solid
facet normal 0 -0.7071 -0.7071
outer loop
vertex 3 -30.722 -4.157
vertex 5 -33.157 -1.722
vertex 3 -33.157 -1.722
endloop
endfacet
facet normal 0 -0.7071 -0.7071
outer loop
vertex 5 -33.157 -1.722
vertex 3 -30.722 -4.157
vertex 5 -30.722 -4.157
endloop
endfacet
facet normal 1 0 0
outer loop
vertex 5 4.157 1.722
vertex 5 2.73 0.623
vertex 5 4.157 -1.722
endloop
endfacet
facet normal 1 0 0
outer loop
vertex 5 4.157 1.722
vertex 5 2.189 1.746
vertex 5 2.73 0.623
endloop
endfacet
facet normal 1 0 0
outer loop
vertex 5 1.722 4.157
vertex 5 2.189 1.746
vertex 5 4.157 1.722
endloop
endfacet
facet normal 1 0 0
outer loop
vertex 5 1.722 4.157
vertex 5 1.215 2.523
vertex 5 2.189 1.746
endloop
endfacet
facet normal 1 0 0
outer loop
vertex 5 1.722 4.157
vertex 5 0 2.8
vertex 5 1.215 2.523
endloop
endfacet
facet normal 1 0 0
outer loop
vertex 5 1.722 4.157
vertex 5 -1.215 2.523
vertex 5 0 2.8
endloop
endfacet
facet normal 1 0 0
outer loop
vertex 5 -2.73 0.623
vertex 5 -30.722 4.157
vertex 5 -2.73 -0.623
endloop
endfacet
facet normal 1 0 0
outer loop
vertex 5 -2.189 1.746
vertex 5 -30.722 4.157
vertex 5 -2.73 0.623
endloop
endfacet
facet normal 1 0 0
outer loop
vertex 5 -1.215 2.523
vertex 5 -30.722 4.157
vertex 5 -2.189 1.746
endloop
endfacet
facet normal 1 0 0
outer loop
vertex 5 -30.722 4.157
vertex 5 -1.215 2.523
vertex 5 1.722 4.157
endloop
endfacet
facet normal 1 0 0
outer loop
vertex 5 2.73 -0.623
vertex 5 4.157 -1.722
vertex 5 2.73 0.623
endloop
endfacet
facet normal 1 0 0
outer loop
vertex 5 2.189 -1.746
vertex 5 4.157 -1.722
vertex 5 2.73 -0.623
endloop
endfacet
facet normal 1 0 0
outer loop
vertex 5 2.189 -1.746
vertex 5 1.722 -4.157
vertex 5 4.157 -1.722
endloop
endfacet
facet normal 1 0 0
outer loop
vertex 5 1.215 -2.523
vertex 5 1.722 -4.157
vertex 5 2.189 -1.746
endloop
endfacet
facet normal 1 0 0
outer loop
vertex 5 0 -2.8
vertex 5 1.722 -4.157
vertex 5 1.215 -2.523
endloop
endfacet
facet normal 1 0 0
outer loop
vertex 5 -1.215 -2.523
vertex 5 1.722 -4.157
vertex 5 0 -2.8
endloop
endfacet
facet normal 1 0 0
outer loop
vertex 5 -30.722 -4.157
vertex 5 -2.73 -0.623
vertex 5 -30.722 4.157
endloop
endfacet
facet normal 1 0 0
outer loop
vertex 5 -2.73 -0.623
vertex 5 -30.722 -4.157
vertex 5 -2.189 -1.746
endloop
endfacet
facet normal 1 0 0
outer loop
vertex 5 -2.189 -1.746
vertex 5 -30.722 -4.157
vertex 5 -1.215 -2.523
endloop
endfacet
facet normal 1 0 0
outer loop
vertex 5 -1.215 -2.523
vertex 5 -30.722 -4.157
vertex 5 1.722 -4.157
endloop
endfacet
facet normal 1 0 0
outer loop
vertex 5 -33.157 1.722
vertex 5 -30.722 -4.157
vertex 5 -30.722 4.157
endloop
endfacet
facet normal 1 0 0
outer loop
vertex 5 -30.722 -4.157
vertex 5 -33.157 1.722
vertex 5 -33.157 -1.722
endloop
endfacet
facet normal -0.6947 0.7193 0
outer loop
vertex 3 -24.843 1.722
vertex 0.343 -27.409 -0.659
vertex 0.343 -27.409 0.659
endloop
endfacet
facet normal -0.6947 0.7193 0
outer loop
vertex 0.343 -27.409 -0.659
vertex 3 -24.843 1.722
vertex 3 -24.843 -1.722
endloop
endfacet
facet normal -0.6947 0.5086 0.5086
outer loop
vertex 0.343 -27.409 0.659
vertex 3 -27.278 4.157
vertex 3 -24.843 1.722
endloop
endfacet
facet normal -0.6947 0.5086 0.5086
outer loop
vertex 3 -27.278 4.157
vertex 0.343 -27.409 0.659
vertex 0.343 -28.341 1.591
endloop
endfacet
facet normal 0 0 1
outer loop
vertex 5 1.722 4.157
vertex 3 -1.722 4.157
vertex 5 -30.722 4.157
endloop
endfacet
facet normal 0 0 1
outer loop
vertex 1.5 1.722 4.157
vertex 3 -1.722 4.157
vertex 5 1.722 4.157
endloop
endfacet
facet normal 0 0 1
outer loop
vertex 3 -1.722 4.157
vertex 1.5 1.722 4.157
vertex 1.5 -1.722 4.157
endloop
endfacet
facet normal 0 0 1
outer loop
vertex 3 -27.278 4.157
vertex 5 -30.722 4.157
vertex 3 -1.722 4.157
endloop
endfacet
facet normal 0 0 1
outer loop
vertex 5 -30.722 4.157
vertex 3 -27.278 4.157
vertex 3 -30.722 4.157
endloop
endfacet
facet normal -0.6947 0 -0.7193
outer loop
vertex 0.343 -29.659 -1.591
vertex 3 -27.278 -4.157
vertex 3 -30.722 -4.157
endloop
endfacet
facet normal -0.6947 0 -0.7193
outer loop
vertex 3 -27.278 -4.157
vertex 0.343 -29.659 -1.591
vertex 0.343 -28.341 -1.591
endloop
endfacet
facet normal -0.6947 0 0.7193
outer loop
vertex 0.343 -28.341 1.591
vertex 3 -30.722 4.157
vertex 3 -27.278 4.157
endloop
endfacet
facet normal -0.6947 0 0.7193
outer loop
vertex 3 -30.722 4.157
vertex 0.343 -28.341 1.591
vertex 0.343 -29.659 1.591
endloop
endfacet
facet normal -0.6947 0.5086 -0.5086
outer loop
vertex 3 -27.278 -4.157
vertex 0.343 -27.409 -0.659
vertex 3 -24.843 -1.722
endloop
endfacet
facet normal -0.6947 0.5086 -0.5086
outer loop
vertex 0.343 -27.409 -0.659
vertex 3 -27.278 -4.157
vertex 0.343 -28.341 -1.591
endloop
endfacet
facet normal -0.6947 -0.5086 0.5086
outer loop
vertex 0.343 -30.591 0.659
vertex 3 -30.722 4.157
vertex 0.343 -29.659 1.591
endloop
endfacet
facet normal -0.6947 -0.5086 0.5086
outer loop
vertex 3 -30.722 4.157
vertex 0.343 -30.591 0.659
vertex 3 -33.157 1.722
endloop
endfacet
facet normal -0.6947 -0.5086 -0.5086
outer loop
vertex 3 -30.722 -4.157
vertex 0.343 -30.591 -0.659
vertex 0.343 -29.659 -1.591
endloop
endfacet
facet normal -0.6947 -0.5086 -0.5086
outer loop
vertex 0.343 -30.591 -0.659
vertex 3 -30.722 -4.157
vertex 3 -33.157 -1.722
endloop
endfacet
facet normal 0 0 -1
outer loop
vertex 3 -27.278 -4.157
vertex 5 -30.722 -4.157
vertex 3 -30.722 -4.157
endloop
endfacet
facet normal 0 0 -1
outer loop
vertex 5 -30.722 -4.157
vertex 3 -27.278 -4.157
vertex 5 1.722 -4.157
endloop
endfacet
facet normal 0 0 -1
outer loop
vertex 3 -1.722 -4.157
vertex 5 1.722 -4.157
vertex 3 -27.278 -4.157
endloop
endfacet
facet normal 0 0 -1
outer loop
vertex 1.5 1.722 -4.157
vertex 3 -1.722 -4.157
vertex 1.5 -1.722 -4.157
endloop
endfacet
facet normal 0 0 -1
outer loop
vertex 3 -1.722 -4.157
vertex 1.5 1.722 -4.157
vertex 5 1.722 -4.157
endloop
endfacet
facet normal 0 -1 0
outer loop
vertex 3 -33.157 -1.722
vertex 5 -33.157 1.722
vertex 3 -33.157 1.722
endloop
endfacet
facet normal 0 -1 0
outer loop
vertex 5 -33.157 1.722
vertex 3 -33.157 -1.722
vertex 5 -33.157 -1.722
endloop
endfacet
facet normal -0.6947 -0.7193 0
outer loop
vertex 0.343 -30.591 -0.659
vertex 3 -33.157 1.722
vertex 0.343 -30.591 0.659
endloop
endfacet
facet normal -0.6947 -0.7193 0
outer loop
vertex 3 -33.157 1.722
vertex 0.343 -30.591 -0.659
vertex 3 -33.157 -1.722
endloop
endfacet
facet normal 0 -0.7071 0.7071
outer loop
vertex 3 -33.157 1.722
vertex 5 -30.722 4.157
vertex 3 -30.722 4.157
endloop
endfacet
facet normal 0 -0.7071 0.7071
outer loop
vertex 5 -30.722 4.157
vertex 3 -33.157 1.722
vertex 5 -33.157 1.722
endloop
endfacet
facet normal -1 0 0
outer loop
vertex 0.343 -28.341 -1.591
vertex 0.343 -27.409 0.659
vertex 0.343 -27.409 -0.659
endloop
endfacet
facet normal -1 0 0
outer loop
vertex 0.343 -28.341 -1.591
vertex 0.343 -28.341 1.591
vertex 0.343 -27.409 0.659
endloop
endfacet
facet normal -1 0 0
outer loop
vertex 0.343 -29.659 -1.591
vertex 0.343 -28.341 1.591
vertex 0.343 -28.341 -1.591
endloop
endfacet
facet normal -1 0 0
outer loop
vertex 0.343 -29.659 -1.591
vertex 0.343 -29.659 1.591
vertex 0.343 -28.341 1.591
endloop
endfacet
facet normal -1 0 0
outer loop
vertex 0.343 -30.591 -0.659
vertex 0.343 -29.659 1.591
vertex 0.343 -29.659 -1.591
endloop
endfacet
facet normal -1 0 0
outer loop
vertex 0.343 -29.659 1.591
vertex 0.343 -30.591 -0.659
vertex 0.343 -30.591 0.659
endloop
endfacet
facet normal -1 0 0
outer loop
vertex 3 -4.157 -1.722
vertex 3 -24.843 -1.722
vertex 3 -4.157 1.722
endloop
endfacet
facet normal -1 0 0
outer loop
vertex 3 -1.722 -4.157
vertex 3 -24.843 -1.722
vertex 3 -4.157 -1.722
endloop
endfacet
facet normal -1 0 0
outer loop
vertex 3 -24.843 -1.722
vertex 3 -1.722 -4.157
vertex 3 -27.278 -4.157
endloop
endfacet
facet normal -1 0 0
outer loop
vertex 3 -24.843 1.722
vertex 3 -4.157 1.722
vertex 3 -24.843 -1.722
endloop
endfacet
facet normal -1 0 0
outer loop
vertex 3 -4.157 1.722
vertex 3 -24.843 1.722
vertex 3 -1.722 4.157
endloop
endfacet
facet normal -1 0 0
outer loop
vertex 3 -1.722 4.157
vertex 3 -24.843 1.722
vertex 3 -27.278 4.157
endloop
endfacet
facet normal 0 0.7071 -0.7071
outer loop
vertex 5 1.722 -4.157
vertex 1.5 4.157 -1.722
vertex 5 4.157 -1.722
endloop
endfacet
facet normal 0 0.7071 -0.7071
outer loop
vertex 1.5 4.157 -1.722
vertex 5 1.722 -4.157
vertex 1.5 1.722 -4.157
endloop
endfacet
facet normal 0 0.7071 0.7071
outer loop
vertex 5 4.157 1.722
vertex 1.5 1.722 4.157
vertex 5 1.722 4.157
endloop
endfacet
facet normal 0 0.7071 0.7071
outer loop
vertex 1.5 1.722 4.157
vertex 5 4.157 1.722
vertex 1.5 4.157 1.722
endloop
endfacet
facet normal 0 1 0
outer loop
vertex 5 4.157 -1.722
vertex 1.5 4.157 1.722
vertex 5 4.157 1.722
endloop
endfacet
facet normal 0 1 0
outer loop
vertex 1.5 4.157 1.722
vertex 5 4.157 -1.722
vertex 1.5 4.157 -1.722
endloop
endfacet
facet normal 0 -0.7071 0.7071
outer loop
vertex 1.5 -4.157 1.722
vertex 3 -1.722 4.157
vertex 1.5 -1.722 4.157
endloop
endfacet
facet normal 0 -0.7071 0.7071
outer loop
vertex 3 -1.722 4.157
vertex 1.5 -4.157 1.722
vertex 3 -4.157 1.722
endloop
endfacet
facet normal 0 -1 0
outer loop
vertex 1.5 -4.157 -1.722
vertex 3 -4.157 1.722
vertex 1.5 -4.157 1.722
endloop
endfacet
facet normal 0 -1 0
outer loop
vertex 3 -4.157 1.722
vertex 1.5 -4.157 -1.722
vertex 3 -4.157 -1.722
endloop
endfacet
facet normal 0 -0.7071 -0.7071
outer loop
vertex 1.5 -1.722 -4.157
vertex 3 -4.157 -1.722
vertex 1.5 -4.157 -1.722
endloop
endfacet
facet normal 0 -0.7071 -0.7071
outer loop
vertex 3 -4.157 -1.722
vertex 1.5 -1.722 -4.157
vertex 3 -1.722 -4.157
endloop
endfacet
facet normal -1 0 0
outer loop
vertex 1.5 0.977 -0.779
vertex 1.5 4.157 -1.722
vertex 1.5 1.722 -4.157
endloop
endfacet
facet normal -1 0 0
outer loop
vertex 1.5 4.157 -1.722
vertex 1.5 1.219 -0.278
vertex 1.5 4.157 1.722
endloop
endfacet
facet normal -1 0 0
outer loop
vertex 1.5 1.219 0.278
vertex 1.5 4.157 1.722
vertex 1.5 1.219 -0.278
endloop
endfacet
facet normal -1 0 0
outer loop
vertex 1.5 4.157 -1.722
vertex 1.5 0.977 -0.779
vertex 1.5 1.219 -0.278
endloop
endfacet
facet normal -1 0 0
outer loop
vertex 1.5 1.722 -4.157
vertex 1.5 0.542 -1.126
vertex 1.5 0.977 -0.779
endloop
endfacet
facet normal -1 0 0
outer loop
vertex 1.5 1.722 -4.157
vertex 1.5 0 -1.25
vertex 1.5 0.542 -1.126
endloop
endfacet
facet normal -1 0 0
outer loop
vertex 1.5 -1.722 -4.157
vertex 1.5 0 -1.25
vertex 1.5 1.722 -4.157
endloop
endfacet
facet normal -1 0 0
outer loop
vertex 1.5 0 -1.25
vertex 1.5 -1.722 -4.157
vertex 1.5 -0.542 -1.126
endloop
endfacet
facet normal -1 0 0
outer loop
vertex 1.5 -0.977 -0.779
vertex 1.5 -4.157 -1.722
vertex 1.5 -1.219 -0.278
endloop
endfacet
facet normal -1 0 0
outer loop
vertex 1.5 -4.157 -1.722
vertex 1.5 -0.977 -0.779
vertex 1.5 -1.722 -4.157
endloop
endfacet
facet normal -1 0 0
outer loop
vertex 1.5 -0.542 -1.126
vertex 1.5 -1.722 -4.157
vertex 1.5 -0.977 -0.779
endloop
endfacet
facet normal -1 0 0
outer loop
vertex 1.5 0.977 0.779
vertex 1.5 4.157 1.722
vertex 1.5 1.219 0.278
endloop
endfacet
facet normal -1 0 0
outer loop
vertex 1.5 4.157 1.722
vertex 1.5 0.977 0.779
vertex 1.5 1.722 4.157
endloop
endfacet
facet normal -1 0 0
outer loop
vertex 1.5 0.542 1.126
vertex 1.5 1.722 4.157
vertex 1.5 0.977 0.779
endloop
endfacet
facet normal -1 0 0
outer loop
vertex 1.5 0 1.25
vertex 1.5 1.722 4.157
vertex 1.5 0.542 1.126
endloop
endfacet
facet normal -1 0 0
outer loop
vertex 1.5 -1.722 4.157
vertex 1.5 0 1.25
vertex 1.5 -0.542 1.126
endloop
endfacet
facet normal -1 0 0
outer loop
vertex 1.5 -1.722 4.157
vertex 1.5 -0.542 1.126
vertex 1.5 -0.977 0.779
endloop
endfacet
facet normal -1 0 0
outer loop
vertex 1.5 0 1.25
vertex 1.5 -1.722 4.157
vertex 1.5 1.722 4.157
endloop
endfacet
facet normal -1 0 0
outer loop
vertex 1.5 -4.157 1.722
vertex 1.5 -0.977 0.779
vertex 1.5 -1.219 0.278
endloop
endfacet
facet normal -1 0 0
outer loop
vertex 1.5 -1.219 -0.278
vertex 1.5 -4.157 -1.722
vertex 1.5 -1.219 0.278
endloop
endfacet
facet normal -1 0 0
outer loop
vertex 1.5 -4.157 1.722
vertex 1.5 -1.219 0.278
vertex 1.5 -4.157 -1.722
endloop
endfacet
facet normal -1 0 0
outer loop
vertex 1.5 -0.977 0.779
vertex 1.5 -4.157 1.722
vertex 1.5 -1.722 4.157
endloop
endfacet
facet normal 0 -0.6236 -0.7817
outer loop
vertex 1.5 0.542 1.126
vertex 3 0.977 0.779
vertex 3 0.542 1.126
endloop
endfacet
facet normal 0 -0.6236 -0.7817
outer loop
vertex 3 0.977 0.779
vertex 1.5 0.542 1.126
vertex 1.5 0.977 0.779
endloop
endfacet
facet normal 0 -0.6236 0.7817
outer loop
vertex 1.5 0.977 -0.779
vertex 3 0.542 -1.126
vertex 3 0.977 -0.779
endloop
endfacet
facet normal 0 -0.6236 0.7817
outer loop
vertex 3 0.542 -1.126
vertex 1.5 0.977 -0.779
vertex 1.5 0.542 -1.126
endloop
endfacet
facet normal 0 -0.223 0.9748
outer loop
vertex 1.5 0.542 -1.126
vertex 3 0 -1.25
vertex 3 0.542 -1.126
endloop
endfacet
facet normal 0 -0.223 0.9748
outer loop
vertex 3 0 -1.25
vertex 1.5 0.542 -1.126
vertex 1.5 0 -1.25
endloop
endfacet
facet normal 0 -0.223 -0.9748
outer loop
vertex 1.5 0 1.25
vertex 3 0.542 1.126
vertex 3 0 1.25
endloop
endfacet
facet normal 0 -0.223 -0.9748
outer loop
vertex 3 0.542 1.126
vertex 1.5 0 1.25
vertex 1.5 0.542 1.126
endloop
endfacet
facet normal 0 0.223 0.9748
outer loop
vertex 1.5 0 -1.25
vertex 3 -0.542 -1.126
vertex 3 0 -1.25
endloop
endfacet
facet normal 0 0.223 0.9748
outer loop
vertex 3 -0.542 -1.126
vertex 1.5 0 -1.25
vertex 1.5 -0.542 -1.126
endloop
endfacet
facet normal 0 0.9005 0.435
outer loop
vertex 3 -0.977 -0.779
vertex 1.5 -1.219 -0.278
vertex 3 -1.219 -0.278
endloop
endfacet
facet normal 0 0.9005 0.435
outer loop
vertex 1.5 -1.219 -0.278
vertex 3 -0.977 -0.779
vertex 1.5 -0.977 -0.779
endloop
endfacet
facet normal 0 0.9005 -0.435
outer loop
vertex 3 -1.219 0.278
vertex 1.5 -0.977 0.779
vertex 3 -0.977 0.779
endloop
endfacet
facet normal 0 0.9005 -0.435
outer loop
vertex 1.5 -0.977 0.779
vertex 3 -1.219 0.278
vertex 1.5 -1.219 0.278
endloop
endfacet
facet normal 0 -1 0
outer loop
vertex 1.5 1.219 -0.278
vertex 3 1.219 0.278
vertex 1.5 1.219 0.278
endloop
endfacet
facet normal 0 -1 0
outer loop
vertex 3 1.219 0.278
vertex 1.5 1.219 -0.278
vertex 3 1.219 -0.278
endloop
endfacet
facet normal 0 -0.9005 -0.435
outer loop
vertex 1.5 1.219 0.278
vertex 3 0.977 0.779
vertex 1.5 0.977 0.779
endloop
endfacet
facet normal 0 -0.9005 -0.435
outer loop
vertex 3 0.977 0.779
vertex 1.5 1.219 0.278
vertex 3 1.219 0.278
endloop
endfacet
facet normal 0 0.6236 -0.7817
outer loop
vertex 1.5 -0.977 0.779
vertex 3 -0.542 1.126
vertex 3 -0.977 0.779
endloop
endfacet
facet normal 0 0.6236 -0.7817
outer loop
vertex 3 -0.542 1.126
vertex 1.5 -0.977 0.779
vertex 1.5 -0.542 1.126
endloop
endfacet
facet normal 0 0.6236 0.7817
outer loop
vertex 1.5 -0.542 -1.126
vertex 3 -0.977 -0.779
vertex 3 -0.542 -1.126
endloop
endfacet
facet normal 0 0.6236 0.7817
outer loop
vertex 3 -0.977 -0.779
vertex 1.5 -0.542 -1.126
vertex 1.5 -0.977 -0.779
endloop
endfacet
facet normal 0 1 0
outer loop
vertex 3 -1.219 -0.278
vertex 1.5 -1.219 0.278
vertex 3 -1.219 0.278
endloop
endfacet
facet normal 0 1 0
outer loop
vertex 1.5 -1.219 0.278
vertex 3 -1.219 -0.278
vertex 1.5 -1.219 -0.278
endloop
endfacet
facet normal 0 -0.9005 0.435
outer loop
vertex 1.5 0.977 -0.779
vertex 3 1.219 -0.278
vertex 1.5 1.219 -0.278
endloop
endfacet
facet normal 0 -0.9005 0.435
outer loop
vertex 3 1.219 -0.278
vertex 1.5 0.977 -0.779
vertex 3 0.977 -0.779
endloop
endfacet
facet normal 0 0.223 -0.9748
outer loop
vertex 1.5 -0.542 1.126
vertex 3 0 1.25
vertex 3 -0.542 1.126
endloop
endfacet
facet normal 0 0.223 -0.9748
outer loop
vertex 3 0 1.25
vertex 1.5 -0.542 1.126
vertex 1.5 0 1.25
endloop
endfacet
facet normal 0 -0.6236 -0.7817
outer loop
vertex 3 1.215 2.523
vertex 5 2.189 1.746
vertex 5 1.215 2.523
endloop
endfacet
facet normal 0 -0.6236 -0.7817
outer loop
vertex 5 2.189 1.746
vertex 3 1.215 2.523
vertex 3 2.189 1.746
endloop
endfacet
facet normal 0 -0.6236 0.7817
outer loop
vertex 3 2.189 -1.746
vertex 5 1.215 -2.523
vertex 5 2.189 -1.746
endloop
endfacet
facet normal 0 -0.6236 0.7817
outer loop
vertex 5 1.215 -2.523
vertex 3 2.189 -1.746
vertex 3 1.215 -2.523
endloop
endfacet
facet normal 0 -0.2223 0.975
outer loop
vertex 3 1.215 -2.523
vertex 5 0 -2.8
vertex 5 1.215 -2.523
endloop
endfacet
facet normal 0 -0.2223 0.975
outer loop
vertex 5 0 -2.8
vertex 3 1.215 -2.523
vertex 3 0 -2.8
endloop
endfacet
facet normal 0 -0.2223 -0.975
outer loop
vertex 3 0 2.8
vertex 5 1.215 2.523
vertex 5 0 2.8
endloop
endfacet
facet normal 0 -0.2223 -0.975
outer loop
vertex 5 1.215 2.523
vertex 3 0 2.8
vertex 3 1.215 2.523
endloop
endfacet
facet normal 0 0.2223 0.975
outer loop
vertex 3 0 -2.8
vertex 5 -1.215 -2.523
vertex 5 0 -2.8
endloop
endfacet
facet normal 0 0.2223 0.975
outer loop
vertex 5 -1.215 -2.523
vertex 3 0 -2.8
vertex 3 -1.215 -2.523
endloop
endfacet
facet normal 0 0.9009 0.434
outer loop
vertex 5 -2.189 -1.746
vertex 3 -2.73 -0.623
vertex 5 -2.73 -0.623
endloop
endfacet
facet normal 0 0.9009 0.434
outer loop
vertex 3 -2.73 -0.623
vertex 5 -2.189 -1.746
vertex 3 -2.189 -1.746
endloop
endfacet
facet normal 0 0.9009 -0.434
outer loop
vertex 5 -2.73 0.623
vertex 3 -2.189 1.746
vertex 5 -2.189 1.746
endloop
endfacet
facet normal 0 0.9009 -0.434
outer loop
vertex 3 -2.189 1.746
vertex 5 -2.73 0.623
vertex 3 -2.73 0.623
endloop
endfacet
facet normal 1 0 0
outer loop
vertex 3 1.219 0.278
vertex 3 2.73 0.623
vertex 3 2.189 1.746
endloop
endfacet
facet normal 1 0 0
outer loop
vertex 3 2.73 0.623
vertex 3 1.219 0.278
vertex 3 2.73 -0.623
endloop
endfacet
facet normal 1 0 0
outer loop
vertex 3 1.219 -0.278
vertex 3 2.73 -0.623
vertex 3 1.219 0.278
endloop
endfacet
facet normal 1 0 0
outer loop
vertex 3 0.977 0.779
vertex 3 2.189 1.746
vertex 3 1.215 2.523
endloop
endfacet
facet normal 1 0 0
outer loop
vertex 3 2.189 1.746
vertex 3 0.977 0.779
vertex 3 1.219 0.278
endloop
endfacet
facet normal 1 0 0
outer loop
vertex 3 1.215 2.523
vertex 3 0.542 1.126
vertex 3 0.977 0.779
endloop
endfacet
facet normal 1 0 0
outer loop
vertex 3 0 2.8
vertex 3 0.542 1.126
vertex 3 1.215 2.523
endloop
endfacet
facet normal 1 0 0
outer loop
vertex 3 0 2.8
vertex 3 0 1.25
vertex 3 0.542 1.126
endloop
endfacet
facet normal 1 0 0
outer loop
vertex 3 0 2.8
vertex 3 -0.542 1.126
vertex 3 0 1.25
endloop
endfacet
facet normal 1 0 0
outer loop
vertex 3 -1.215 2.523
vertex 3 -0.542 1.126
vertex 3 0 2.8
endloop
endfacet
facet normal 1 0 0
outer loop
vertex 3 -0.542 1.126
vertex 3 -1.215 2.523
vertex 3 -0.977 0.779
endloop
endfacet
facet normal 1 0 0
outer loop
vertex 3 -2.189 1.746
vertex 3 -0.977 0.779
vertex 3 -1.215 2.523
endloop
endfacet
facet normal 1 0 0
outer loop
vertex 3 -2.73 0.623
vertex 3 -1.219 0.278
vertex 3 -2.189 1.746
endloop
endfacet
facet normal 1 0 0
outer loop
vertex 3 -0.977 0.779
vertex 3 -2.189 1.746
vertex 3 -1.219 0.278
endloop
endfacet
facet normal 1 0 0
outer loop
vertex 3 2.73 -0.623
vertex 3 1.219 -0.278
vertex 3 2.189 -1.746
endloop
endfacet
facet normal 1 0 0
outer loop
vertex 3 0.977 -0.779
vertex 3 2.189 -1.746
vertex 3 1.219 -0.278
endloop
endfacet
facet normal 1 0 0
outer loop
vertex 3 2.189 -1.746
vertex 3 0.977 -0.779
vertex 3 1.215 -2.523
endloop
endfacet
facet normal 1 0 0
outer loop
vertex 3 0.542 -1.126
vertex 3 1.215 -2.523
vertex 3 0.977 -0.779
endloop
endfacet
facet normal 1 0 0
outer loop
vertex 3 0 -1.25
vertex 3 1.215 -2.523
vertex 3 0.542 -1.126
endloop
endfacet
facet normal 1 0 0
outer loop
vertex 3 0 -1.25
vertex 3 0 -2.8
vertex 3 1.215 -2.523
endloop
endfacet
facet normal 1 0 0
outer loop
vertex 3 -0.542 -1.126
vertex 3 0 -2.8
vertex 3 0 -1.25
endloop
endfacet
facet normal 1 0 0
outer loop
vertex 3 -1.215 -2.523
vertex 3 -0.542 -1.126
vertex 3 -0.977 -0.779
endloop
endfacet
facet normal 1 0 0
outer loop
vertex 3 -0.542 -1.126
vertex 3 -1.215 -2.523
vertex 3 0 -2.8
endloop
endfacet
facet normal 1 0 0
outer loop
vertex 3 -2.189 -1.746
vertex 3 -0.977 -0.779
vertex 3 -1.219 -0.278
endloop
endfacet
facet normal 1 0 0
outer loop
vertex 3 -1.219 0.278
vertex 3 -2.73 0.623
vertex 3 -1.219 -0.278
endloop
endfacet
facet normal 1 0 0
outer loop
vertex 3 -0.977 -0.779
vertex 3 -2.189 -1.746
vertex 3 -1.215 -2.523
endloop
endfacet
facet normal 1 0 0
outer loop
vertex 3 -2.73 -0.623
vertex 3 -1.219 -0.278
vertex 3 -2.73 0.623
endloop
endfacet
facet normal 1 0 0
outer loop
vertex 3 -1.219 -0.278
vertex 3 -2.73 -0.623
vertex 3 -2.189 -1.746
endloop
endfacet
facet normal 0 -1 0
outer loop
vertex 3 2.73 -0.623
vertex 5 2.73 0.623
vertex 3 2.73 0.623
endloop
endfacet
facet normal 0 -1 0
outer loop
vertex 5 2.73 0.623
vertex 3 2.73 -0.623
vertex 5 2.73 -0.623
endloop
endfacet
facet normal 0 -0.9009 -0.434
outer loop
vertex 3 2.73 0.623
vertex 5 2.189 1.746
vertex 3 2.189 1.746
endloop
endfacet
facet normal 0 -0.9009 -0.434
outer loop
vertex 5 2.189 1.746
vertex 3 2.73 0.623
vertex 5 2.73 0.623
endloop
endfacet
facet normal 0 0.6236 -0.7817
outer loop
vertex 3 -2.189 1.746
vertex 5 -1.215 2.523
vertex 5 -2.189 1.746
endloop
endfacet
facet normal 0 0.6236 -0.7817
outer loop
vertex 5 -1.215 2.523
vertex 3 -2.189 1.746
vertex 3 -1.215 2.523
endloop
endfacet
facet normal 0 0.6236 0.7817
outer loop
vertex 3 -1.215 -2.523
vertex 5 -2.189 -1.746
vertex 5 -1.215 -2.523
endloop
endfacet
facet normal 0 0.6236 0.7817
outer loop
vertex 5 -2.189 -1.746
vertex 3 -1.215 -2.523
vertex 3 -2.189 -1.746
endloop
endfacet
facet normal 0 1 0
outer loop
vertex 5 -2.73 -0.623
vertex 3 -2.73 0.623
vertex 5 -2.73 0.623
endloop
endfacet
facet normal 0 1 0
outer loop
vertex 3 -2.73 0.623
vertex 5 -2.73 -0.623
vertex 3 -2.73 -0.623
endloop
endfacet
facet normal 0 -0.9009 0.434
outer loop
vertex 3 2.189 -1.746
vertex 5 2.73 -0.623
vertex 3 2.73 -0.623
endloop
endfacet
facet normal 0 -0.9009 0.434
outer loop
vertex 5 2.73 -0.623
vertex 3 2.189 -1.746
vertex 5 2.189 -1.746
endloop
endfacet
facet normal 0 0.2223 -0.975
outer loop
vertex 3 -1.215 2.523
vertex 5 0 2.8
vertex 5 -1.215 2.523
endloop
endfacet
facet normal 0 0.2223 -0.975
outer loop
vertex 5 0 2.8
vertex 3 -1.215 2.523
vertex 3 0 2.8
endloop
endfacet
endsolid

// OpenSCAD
use <../openscad/libs/utilities.scad>

rotate_y(90){
    nano_converter_plate_gripper();
}

module nano_converter_plate_gripper(){

    // defining temporary module for cylinder that
    // will print better when turned sideways
    module cyl_rot(d, h, center=false){
        $fn=8;
        rotate_z(22.5){
            cylinder(d=d, h=h, center=center);
        }
    }
    // and another for a hemisphere sphere
    module semi_sph_rot(d){
        $fn=8;
        rotate_z(22.5){
            difference(){
                sphere(d=d);
                cylinder(d=2*d,h=2*d);
            }
        }
    }
    bridge_h = 3;
    bridge_t = 2;
    h_diff = 1.5;
    centre2centre_d = 29;
    cyl_d = 9;
    difference(){
        union(){
            translate_z(h_diff){
                cyl_rot(d=cyl_d, h=bridge_h-h_diff+tiny());
            }
            sequential_hull(){
                translate([0, -centre2centre_d, cyl_d/2]){
                    semi_sph_rot(d=cyl_d);
                }
                translate([0, -centre2centre_d, bridge_h]){
                    cyl_rot(d=cyl_d, h=bridge_t);
                }
                translate_z(bridge_h){
                    cyl_rot(d=cyl_d, h=bridge_t);
                }
            }
        }

        translate_z(1.5+h_diff){
            no2_selftap_counterbore();
        }
    }
}
